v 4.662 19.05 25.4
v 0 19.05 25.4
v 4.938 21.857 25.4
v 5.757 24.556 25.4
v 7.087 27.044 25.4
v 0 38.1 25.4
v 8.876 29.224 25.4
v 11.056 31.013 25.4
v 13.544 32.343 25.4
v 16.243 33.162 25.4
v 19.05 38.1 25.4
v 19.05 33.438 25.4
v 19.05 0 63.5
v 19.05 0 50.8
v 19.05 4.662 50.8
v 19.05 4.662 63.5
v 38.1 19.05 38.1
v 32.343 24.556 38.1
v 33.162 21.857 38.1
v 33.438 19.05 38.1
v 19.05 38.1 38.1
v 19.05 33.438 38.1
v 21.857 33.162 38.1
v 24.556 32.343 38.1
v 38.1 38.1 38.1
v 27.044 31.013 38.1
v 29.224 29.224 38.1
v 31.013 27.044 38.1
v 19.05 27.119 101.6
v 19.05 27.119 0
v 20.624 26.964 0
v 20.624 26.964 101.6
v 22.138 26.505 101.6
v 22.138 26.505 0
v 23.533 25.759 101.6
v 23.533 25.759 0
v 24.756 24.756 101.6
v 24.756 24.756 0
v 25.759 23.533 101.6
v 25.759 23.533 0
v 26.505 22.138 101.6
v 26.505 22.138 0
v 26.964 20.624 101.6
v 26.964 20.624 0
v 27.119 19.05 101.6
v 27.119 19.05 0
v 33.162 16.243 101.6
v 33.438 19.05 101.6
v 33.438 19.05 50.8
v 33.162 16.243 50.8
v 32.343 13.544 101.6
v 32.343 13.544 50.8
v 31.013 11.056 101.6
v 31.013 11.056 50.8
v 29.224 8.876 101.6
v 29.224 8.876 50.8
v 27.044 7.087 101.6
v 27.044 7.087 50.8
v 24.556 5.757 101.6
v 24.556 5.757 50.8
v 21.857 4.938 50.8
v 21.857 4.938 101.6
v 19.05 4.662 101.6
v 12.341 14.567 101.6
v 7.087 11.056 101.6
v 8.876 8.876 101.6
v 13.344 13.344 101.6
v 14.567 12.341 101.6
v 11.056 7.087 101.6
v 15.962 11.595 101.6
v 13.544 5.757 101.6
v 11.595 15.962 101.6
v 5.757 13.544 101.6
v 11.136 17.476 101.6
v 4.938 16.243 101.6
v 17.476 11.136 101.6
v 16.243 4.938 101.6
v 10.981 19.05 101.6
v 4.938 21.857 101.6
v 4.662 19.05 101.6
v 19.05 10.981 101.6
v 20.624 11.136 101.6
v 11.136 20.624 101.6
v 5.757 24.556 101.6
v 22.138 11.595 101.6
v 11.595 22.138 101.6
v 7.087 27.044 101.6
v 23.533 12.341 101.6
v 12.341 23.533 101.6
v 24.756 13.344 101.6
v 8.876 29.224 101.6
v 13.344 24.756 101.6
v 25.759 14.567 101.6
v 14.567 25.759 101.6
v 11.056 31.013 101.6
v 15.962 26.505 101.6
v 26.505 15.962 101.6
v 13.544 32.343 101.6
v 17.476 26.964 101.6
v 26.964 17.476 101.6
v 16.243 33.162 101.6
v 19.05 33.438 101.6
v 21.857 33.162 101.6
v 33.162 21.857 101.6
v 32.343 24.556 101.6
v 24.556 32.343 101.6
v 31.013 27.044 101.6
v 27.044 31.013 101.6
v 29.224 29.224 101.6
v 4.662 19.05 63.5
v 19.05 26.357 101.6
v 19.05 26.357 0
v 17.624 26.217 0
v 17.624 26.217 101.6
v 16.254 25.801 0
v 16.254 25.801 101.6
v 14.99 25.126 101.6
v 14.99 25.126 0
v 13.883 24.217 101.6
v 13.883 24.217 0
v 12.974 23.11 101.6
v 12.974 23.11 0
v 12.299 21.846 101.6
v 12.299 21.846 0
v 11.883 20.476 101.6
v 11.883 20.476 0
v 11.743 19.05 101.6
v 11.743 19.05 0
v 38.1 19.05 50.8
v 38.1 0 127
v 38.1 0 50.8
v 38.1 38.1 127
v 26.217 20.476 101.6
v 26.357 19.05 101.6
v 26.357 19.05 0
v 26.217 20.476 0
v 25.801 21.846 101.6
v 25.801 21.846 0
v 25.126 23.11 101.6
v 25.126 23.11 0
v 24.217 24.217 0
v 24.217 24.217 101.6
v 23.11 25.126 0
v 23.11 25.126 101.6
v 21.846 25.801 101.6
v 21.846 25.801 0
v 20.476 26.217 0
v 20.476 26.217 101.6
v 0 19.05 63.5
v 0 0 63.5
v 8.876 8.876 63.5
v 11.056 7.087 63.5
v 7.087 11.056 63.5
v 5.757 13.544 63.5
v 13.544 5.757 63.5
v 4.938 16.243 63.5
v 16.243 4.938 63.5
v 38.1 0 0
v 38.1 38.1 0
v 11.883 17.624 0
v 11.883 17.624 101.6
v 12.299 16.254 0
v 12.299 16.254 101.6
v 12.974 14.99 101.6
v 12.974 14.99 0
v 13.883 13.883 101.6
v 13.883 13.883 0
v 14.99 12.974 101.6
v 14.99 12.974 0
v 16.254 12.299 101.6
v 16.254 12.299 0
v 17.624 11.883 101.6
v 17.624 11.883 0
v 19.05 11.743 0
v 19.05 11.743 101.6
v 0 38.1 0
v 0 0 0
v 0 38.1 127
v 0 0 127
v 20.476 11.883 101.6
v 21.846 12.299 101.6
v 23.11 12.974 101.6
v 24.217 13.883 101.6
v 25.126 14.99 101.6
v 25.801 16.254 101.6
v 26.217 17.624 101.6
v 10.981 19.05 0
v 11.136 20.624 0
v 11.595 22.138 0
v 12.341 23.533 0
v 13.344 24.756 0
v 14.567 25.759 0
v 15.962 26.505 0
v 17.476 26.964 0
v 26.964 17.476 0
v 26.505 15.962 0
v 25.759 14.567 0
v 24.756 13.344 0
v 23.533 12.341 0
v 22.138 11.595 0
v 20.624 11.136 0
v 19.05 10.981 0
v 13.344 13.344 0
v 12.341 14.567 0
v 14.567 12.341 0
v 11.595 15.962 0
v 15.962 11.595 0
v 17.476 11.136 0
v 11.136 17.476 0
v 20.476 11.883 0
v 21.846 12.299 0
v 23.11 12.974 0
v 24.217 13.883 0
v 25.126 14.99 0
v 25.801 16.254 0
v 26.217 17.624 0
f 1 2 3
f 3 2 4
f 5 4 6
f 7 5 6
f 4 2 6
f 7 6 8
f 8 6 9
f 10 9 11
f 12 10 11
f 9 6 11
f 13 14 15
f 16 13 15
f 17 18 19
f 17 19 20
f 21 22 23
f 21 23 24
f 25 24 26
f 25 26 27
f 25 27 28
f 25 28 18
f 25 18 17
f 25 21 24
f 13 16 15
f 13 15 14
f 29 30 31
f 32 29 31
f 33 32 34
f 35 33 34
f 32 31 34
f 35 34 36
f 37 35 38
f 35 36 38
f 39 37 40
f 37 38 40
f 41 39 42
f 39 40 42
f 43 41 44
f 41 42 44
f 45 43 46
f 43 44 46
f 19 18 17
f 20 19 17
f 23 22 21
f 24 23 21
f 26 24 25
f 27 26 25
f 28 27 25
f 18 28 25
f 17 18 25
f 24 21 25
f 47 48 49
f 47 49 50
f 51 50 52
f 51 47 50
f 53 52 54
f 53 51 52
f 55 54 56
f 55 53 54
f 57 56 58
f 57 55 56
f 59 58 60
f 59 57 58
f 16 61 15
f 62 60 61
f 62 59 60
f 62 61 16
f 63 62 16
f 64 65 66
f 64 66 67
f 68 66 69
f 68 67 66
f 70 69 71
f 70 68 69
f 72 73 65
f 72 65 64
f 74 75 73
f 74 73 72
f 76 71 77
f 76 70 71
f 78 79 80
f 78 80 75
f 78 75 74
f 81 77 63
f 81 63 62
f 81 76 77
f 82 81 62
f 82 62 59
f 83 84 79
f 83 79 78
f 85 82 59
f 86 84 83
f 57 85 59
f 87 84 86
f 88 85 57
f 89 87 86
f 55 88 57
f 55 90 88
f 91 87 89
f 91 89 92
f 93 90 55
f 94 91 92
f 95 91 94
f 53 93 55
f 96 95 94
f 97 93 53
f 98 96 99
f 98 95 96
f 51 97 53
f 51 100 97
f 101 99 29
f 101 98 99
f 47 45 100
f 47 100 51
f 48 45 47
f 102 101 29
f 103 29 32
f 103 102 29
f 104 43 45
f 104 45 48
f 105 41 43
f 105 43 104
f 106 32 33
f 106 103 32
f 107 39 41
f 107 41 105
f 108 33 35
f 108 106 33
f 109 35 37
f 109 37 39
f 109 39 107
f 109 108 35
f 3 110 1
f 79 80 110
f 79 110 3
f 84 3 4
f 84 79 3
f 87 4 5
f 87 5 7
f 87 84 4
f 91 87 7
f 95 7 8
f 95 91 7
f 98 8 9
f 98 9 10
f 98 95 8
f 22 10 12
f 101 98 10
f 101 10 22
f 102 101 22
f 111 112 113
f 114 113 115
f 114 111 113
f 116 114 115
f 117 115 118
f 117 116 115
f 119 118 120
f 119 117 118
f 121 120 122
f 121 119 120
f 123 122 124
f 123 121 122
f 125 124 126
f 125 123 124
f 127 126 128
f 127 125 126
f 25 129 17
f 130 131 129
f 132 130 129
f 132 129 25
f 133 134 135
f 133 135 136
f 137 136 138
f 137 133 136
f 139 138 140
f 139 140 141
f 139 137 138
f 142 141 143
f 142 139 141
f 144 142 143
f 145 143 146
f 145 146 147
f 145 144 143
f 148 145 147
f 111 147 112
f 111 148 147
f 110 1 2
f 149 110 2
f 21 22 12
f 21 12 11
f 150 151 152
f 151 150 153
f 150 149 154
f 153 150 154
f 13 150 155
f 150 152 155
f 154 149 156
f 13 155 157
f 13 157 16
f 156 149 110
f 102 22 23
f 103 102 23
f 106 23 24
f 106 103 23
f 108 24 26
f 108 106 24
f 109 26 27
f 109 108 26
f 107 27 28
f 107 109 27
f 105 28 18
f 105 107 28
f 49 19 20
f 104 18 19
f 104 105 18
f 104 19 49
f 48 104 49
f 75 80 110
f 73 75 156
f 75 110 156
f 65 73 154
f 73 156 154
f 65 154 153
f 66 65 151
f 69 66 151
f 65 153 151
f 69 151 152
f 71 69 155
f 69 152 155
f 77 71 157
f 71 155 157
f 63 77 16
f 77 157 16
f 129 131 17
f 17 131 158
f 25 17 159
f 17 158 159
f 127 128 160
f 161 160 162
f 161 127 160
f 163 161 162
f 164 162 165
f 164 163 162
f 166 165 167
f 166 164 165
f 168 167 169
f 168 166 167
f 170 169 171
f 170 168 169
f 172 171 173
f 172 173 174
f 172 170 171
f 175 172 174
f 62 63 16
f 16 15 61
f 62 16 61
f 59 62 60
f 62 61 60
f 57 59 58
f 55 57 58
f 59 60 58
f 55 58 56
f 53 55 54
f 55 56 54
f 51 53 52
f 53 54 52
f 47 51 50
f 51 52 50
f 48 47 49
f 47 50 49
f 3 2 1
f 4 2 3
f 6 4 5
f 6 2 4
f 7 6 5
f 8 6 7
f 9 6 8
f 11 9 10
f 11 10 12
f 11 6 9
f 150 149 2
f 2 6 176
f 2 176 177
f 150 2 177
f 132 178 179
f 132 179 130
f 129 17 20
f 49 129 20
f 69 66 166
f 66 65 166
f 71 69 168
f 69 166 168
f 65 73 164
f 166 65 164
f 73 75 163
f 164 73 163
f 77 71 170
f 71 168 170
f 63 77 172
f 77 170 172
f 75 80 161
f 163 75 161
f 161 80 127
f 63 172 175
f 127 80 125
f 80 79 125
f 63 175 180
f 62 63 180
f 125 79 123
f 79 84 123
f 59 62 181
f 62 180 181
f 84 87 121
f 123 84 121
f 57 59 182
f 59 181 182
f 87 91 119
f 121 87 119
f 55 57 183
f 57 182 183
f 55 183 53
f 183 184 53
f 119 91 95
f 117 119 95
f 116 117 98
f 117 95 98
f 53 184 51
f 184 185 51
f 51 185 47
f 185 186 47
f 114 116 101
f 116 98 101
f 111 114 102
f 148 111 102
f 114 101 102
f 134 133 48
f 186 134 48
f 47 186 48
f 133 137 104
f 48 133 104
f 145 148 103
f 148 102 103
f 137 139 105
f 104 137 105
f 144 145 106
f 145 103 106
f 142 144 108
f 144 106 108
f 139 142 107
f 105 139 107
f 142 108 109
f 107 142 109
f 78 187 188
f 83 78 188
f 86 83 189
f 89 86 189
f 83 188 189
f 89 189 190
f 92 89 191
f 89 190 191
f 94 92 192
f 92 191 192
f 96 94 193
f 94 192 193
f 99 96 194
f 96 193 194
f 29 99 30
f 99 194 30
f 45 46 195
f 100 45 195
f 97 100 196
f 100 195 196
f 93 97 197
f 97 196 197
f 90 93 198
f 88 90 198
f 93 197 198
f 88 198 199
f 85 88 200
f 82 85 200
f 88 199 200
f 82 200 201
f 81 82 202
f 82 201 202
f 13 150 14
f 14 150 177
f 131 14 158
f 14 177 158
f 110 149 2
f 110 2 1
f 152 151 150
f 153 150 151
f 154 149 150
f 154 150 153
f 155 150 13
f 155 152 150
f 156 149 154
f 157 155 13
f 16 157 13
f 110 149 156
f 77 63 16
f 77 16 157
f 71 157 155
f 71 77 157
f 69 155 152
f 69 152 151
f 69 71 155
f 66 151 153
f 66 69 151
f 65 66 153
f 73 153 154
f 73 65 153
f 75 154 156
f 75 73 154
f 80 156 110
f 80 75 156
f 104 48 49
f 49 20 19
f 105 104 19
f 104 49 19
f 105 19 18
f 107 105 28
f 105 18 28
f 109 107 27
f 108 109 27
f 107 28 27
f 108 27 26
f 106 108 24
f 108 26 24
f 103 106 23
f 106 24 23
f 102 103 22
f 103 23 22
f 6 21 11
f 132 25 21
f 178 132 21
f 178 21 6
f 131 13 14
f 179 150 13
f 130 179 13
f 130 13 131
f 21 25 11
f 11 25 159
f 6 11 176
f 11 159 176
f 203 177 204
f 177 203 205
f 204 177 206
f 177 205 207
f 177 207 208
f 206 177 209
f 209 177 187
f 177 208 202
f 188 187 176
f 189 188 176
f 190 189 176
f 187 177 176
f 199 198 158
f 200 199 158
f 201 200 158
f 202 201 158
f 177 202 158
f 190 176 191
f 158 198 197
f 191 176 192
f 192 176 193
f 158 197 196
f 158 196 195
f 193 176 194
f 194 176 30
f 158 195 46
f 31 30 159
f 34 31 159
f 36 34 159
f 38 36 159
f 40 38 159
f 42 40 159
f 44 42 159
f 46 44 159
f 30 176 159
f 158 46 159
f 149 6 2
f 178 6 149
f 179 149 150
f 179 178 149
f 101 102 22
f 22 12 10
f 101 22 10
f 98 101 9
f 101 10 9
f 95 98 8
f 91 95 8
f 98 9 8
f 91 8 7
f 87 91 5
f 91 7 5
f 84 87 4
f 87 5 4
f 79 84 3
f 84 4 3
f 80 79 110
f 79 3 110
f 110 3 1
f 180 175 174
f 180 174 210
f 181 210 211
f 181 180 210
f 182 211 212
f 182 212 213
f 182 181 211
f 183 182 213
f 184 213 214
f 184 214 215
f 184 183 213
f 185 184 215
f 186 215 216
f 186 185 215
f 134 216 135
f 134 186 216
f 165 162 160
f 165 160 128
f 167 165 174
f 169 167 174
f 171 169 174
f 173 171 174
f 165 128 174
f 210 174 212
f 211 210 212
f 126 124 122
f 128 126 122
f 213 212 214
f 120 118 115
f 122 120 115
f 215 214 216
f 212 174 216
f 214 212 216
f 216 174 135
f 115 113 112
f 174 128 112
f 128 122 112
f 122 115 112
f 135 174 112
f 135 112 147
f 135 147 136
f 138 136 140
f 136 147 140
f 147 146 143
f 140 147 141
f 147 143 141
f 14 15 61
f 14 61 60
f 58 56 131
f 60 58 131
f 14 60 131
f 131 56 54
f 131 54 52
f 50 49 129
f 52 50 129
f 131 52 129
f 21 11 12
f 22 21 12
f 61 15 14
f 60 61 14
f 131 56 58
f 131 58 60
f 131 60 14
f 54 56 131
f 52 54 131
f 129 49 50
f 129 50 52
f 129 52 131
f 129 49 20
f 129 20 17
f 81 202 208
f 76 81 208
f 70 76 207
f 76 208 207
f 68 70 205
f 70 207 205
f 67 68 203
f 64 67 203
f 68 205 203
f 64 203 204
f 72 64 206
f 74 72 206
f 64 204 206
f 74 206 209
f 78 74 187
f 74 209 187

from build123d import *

# Parameters (mm, degrees)
F1_DEPTH  = 25.4
F2_DEPTH  = 38.1
F3_DEPTH  = 50.8
F4_DEPTH  = 63.5
F5_DEPTH  = 101.6
F7_DEPTH  = 101.6
F8_DEPTH  = 25.4
F9_DEPTH  = 38.1
F10_DEPTH = 50.8
F11_DEPTH = 63.5
F12_DEPTH = 76.2


with BuildPart() as f1:
    # F0 (on Top) → F1 (new body)
    with BuildSketch(Plane.XY):
        with BuildLine():
            Line((0, 38.1), (0, 19.05))
            Line((0, 19.05), (4.6619887504, 19.05))
            ThreePointArc((4.6619887504, 19.05), (8.8761396776, 29.2238603224), (19.05, 33.4380112496))
            Line((19.05, 33.4380112496), (19.05, 38.1))
            Line((19.05, 38.1), (0, 38.1))
        make_face()
    extrude(amount=F1_DEPTH)

    # F0 (on Top) → F2 (join)
    with BuildSketch(Plane.XY):
        with BuildLine():
            Line((33.4380112496, 19.05), (38.1, 19.05))
            Line((38.1, 19.05), (38.1, 38.1))
            Line((38.1, 38.1), (19.05, 38.1))
            Line((19.05, 38.1), (19.05, 33.4380112496))
            ThreePointArc((19.05, 33.4380112496), (29.2238603224, 29.2238603224), (33.4380112496, 19.05))
        make_face()
    extrude(amount=F2_DEPTH)

    # F0 (on Top) → F3 (join)
    with BuildSketch(Plane.XY):
        with BuildLine():
            Line((19.05, 4.6619887504), (19.05, 0))
            Line((19.05, 0), (38.1, 0))
            Line((38.1, 0), (38.1, 19.05))
            Line((38.1, 19.05), (33.4380112496, 19.05))
            ThreePointArc((33.4380112496, 19.05), (29.2238603224, 8.8761396776), (19.05, 4.6619887504))
        make_face()
    extrude(amount=F3_DEPTH)

    # F0 (on Top) → F4 (join)
    with BuildSketch(Plane.XY):
        with BuildLine():
            Line((0, 19.05), (0, 0))
            Line((0, 0), (19.05, 0))
            Line((19.05, 0), (19.05, 4.6619887504))
            ThreePointArc((19.05, 4.6619887504), (8.8761396776, 8.8761396776), (4.6619887504, 19.05))
            Line((4.6619887504, 19.05), (0, 19.05))
        make_face()
    extrude(amount=F4_DEPTH)

    # F0 (on Top) → F5 (join)
    with BuildSketch(Plane.XY):
        with BuildLine():
            ThreePointArc((19.05, 33.4380112496), (8.8761396776, 29.2238603224), (4.6619887504, 19.05))
            Line((4.6619887504, 19.05), (10.9808641353, 19.05))
            ThreePointArc((10.9808641353, 19.05), (13.3442593118, 24.7557406882), (19.05, 27.1191358647))
            Line((19.05, 27.1191358647), (19.05, 33.4380112496))
        make_face()
        with BuildLine():
            Line((27.1191358647, 19.05), (33.4380112496, 19.05))
            ThreePointArc((33.4380112496, 19.05), (29.2238603224, 29.2238603224), (19.05, 33.4380112496))
            Line((19.05, 33.4380112496), (19.05, 27.1191358647))
            ThreePointArc((19.05, 27.1191358647), (24.7557406882, 24.7557406882), (27.1191358647, 19.05))
        make_face()
        with BuildLine():
            Line((19.05, 10.9808641353), (19.05, 4.6619887504))
            ThreePointArc((19.05, 4.6619887504), (29.2238603224, 8.8761396776), (33.4380112496, 19.05))
            Line((33.4380112496, 19.05), (27.1191358647, 19.05))
            ThreePointArc((27.1191358647, 19.05), (24.7557406882, 13.3442593118), (19.05, 10.9808641353))
        make_face()
        with BuildLine():
            ThreePointArc((4.6619887504, 19.05), (8.8761396776, 8.8761396776), (19.05, 4.6619887504))
            Line((19.05, 4.6619887504), (19.05, 10.9808641353))
            ThreePointArc((19.05, 10.9808641353), (13.3442593118, 13.3442593118), (10.9808641353, 19.05))
            Line((10.9808641353, 19.05), (4.6619887504, 19.05))
        make_face()
    extrude(amount=F5_DEPTH)


with BuildPart() as f7:
    # F6 (on face) → F7 (new body, through all)
    with BuildSketch(Plane.XY.offset(101.6)):
        with BuildLine():
            Line((19.05, 19.05), (19.05, 26.3571361959))
            ThreePointArc((19.05, 26.3571361959), (13.8830744448, 24.2169255552), (11.7428638041, 19.05))
            Line((11.7428638041, 19.05), (19.05, 19.05))
        make_face()
        with BuildLine():
            Line((19.05, 19.05), (26.3571361959, 19.05))
            ThreePointArc((26.3571361959, 19.05), (24.2169255552, 24.2169255552), (19.05, 26.3571361959))
            Line((19.05, 26.3571361959), (19.05, 19.05))
        make_face()
        with BuildLine():
            ThreePointArc((11.7428638041, 19.05), (13.8830744448, 13.8830744448), (19.05, 11.7428638041))
            Line((19.05, 11.7428638041), (19.05, 19.05))
            Line((19.05, 19.05), (11.7428638041, 19.05))
        make_face()
        with BuildLine():
            ThreePointArc((19.05, 11.7428638041), (24.2169255552, 13.8830744448), (26.3571361959, 19.05))
            Line((26.3571361959, 19.05), (19.05, 19.05))
            Line((19.05, 19.05), (19.05, 11.7428638041))
        make_face()
    extrude(amount=-F7_DEPTH)

    # F6 (on face) → F8 (join)
    with BuildSketch(Plane.XY.offset(101.6)):
        with BuildLine():
            Line((38.1, 19.05), (33.4380112496, 19.05))
            ThreePointArc((33.4380112496, 19.05), (29.2238603224, 8.8761396776), (19.05, 4.6619887504))
            Line((19.05, 4.6619887504), (19.05, 0))
            Line((19.05, 0), (38.1, 0))
            Line((38.1, 0), (38.1, 19.05))
        make_face()
        with BuildLine():
            ThreePointArc((19.05, 4.6619887504), (29.2238603224, 8.8761396776), (33.4380112496, 19.05))
            Line((33.4380112496, 19.05), (27.1191358647, 19.05))
            ThreePointArc((27.1191358647, 19.05), (24.7557406882, 13.3442593118), (19.05, 10.9808641353))
            Line((19.05, 10.9808641353), (19.05, 4.6619887504))
        make_face()
        with BuildLine():
            ThreePointArc((19.05, 10.9808641353), (24.7557406882, 13.3442593118), (27.1191358647, 19.05))
            Line((27.1191358647, 19.05), (26.3571361959, 19.05))
            ThreePointArc((26.3571361959, 19.05), (24.2169255552, 13.8830744448), (19.05, 11.7428638041))
            Line((19.05, 11.7428638041), (19.05, 10.9808641353))
        make_face()
        with BuildLine():
            ThreePointArc((19.05, 11.7428638041), (24.2169255552, 13.8830744448), (26.3571361959, 19.05))
            Line((26.3571361959, 19.05), (19.05, 19.05))
            Line((19.05, 19.05), (19.05, 11.7428638041))
        make_face()
        with BuildLine():
            ThreePointArc((11.7428638041, 19.05), (13.8830744448, 13.8830744448), (19.05, 11.7428638041))
            Line((19.05, 11.7428638041), (19.05, 19.05))
            Line((19.05, 19.05), (11.7428638041, 19.05))
        make_face()
        with BuildLine():
            ThreePointArc((10.9808641353, 19.05), (13.3442593118, 13.3442593118), (19.05, 10.9808641353))
            Line((19.05, 10.9808641353), (19.05, 11.7428638041))
            ThreePointArc((19.05, 11.7428638041), (13.8830744448, 13.8830744448), (11.7428638041, 19.05))
            Line((11.7428638041, 19.05), (10.9808641353, 19.05))
        make_face()
        with BuildLine():
            ThreePointArc((4.6619887504, 19.05), (8.8761396776, 8.8761396776), (19.05, 4.6619887504))
            Line((19.05, 4.6619887504), (19.05, 10.9808641353))
            ThreePointArc((19.05, 10.9808641353), (13.3442593118, 13.3442593118), (10.9808641353, 19.05))
            Line((10.9808641353, 19.05), (4.6619887504, 19.05))
        make_face()
        with BuildLine():
            Line((19.05, 0), (19.05, 4.6619887504))
            ThreePointArc((19.05, 4.6619887504), (8.8761396776, 8.8761396776), (4.6619887504, 19.05))
            Line((4.6619887504, 19.05), (0, 19.05))
            Line((0, 19.05), (0, 0))
            Line((0, 0), (19.05, 0))
        make_face()
        with BuildLine():
            Line((19.05, 19.05), (19.05, 26.3571361959))
            ThreePointArc((19.05, 26.3571361959), (13.8830744448, 24.2169255552), (11.7428638041, 19.05))
            Line((11.7428638041, 19.05), (19.05, 19.05))
        make_face()
        with BuildLine():
            Line((19.05, 26.3571361959), (19.05, 27.1191358647))
            ThreePointArc((19.05, 27.1191358647), (13.3442593118, 24.7557406882), (10.9808641353, 19.05))
            Line((10.9808641353, 19.05), (11.7428638041, 19.05))
            ThreePointArc((11.7428638041, 19.05), (13.8830744448, 24.2169255552), (19.05, 26.3571361959))
        make_face()
        with BuildLine():
            Line((19.05, 27.1191358647), (19.05, 33.4380112496))
            ThreePointArc((19.05, 33.4380112496), (8.8761396776, 29.2238603224), (4.6619887504, 19.05))
            Line((4.6619887504, 19.05), (10.9808641353, 19.05))
            ThreePointArc((10.9808641353, 19.05), (13.3442593118, 24.7557406882), (19.05, 27.1191358647))
        make_face()
        with BuildLine():
            ThreePointArc((4.6619887504, 19.05), (8.8761396776, 29.2238603224), (19.05, 33.4380112496))
            Line((19.05, 33.4380112496), (19.05, 38.1))
            Line((19.05, 38.1), (0, 38.1))
            Line((0, 38.1), (0, 19.05))
            Line((0, 19.05), (4.6619887504, 19.05))
        make_face()
        with BuildLine():
            Line((19.05, 19.05), (26.3571361959, 19.05))
            ThreePointArc((26.3571361959, 19.05), (24.2169255552, 24.2169255552), (19.05, 26.3571361959))
            Line((19.05, 26.3571361959), (19.05, 19.05))
        make_face()
        with BuildLine():
            Line((26.3571361959, 19.05), (27.1191358647, 19.05))
            ThreePointArc((27.1191358647, 19.05), (24.7557406882, 24.7557406882), (19.05, 27.1191358647))
            Line((19.05, 27.1191358647), (19.05, 26.3571361959))
            ThreePointArc((19.05, 26.3571361959), (24.2169255552, 24.2169255552), (26.3571361959, 19.05))
        make_face()
        with BuildLine():
            Line((27.1191358647, 19.05), (33.4380112496, 19.05))
            ThreePointArc((33.4380112496, 19.05), (29.2238603224, 29.2238603224), (19.05, 33.4380112496))
            Line((19.05, 33.4380112496), (19.05, 27.1191358647))
            ThreePointArc((19.05, 27.1191358647), (24.7557406882, 24.7557406882), (27.1191358647, 19.05))
        make_face()
        with BuildLine():
            ThreePointArc((19.05, 33.4380112496), (29.2238603224, 29.2238603224), (33.4380112496, 19.05))
            Line((33.4380112496, 19.05), (38.1, 19.05))
            Line((38.1, 19.05), (38.1, 38.1))
            Line((38.1, 38.1), (19.05, 38.1))
            Line((19.05, 38.1), (19.05, 33.4380112496))
        make_face()
    extrude(amount=F8_DEPTH)

    # F6 (on face) → F9 (join, through all)
    with BuildSketch(Plane.XY.offset(101.6)):
        with BuildLine():
            Line((19.05, 0), (19.05, 4.6619887504))
            ThreePointArc((19.05, 4.6619887504), (8.8761396776, 8.8761396776), (4.6619887504, 19.05))
            Line((4.6619887504, 19.05), (0, 19.05))
            Line((0, 19.05), (0, 0))
            Line((0, 0), (19.05, 0))
        make_face()
    extrude(amount=-F9_DEPTH)

    # F6 (on face) → F10 (join, through all)
    with BuildSketch(Plane.XY.offset(101.6)):
        with BuildLine():
            Line((38.1, 19.05), (33.4380112496, 19.05))
            ThreePointArc((33.4380112496, 19.05), (29.2238603224, 8.8761396776), (19.05, 4.6619887504))
            Line((19.05, 4.6619887504), (19.05, 0))
            Line((19.05, 0), (38.1, 0))
            Line((38.1, 0), (38.1, 19.05))
        make_face()
    extrude(amount=-F10_DEPTH)

    # F6 (on face) → F11 (join, through all)
    with BuildSketch(Plane.XY.offset(101.6)):
        with BuildLine():
            ThreePointArc((19.05, 33.4380112496), (29.2238603224, 29.2238603224), (33.4380112496, 19.05))
            Line((33.4380112496, 19.05), (38.1, 19.05))
            Line((38.1, 19.05), (38.1, 38.1))
            Line((38.1, 38.1), (19.05, 38.1))
            Line((19.05, 38.1), (19.05, 33.4380112496))
        make_face()
    extrude(amount=-F11_DEPTH)

    # F6 (on face) → F12 (join, through all)
    with BuildSketch(Plane.XY.offset(101.6)):
        with BuildLine():
            ThreePointArc((4.6619887504, 19.05), (8.8761396776, 29.2238603224), (19.05, 33.4380112496))
            Line((19.05, 33.4380112496), (19.05, 38.1))
            Line((19.05, 38.1), (0, 38.1))
            Line((0, 38.1), (0, 19.05))
            Line((0, 19.05), (4.6619887504, 19.05))
        make_face()
    extrude(amount=-F12_DEPTH)


solid = Compound([f1.part, f7.part])
